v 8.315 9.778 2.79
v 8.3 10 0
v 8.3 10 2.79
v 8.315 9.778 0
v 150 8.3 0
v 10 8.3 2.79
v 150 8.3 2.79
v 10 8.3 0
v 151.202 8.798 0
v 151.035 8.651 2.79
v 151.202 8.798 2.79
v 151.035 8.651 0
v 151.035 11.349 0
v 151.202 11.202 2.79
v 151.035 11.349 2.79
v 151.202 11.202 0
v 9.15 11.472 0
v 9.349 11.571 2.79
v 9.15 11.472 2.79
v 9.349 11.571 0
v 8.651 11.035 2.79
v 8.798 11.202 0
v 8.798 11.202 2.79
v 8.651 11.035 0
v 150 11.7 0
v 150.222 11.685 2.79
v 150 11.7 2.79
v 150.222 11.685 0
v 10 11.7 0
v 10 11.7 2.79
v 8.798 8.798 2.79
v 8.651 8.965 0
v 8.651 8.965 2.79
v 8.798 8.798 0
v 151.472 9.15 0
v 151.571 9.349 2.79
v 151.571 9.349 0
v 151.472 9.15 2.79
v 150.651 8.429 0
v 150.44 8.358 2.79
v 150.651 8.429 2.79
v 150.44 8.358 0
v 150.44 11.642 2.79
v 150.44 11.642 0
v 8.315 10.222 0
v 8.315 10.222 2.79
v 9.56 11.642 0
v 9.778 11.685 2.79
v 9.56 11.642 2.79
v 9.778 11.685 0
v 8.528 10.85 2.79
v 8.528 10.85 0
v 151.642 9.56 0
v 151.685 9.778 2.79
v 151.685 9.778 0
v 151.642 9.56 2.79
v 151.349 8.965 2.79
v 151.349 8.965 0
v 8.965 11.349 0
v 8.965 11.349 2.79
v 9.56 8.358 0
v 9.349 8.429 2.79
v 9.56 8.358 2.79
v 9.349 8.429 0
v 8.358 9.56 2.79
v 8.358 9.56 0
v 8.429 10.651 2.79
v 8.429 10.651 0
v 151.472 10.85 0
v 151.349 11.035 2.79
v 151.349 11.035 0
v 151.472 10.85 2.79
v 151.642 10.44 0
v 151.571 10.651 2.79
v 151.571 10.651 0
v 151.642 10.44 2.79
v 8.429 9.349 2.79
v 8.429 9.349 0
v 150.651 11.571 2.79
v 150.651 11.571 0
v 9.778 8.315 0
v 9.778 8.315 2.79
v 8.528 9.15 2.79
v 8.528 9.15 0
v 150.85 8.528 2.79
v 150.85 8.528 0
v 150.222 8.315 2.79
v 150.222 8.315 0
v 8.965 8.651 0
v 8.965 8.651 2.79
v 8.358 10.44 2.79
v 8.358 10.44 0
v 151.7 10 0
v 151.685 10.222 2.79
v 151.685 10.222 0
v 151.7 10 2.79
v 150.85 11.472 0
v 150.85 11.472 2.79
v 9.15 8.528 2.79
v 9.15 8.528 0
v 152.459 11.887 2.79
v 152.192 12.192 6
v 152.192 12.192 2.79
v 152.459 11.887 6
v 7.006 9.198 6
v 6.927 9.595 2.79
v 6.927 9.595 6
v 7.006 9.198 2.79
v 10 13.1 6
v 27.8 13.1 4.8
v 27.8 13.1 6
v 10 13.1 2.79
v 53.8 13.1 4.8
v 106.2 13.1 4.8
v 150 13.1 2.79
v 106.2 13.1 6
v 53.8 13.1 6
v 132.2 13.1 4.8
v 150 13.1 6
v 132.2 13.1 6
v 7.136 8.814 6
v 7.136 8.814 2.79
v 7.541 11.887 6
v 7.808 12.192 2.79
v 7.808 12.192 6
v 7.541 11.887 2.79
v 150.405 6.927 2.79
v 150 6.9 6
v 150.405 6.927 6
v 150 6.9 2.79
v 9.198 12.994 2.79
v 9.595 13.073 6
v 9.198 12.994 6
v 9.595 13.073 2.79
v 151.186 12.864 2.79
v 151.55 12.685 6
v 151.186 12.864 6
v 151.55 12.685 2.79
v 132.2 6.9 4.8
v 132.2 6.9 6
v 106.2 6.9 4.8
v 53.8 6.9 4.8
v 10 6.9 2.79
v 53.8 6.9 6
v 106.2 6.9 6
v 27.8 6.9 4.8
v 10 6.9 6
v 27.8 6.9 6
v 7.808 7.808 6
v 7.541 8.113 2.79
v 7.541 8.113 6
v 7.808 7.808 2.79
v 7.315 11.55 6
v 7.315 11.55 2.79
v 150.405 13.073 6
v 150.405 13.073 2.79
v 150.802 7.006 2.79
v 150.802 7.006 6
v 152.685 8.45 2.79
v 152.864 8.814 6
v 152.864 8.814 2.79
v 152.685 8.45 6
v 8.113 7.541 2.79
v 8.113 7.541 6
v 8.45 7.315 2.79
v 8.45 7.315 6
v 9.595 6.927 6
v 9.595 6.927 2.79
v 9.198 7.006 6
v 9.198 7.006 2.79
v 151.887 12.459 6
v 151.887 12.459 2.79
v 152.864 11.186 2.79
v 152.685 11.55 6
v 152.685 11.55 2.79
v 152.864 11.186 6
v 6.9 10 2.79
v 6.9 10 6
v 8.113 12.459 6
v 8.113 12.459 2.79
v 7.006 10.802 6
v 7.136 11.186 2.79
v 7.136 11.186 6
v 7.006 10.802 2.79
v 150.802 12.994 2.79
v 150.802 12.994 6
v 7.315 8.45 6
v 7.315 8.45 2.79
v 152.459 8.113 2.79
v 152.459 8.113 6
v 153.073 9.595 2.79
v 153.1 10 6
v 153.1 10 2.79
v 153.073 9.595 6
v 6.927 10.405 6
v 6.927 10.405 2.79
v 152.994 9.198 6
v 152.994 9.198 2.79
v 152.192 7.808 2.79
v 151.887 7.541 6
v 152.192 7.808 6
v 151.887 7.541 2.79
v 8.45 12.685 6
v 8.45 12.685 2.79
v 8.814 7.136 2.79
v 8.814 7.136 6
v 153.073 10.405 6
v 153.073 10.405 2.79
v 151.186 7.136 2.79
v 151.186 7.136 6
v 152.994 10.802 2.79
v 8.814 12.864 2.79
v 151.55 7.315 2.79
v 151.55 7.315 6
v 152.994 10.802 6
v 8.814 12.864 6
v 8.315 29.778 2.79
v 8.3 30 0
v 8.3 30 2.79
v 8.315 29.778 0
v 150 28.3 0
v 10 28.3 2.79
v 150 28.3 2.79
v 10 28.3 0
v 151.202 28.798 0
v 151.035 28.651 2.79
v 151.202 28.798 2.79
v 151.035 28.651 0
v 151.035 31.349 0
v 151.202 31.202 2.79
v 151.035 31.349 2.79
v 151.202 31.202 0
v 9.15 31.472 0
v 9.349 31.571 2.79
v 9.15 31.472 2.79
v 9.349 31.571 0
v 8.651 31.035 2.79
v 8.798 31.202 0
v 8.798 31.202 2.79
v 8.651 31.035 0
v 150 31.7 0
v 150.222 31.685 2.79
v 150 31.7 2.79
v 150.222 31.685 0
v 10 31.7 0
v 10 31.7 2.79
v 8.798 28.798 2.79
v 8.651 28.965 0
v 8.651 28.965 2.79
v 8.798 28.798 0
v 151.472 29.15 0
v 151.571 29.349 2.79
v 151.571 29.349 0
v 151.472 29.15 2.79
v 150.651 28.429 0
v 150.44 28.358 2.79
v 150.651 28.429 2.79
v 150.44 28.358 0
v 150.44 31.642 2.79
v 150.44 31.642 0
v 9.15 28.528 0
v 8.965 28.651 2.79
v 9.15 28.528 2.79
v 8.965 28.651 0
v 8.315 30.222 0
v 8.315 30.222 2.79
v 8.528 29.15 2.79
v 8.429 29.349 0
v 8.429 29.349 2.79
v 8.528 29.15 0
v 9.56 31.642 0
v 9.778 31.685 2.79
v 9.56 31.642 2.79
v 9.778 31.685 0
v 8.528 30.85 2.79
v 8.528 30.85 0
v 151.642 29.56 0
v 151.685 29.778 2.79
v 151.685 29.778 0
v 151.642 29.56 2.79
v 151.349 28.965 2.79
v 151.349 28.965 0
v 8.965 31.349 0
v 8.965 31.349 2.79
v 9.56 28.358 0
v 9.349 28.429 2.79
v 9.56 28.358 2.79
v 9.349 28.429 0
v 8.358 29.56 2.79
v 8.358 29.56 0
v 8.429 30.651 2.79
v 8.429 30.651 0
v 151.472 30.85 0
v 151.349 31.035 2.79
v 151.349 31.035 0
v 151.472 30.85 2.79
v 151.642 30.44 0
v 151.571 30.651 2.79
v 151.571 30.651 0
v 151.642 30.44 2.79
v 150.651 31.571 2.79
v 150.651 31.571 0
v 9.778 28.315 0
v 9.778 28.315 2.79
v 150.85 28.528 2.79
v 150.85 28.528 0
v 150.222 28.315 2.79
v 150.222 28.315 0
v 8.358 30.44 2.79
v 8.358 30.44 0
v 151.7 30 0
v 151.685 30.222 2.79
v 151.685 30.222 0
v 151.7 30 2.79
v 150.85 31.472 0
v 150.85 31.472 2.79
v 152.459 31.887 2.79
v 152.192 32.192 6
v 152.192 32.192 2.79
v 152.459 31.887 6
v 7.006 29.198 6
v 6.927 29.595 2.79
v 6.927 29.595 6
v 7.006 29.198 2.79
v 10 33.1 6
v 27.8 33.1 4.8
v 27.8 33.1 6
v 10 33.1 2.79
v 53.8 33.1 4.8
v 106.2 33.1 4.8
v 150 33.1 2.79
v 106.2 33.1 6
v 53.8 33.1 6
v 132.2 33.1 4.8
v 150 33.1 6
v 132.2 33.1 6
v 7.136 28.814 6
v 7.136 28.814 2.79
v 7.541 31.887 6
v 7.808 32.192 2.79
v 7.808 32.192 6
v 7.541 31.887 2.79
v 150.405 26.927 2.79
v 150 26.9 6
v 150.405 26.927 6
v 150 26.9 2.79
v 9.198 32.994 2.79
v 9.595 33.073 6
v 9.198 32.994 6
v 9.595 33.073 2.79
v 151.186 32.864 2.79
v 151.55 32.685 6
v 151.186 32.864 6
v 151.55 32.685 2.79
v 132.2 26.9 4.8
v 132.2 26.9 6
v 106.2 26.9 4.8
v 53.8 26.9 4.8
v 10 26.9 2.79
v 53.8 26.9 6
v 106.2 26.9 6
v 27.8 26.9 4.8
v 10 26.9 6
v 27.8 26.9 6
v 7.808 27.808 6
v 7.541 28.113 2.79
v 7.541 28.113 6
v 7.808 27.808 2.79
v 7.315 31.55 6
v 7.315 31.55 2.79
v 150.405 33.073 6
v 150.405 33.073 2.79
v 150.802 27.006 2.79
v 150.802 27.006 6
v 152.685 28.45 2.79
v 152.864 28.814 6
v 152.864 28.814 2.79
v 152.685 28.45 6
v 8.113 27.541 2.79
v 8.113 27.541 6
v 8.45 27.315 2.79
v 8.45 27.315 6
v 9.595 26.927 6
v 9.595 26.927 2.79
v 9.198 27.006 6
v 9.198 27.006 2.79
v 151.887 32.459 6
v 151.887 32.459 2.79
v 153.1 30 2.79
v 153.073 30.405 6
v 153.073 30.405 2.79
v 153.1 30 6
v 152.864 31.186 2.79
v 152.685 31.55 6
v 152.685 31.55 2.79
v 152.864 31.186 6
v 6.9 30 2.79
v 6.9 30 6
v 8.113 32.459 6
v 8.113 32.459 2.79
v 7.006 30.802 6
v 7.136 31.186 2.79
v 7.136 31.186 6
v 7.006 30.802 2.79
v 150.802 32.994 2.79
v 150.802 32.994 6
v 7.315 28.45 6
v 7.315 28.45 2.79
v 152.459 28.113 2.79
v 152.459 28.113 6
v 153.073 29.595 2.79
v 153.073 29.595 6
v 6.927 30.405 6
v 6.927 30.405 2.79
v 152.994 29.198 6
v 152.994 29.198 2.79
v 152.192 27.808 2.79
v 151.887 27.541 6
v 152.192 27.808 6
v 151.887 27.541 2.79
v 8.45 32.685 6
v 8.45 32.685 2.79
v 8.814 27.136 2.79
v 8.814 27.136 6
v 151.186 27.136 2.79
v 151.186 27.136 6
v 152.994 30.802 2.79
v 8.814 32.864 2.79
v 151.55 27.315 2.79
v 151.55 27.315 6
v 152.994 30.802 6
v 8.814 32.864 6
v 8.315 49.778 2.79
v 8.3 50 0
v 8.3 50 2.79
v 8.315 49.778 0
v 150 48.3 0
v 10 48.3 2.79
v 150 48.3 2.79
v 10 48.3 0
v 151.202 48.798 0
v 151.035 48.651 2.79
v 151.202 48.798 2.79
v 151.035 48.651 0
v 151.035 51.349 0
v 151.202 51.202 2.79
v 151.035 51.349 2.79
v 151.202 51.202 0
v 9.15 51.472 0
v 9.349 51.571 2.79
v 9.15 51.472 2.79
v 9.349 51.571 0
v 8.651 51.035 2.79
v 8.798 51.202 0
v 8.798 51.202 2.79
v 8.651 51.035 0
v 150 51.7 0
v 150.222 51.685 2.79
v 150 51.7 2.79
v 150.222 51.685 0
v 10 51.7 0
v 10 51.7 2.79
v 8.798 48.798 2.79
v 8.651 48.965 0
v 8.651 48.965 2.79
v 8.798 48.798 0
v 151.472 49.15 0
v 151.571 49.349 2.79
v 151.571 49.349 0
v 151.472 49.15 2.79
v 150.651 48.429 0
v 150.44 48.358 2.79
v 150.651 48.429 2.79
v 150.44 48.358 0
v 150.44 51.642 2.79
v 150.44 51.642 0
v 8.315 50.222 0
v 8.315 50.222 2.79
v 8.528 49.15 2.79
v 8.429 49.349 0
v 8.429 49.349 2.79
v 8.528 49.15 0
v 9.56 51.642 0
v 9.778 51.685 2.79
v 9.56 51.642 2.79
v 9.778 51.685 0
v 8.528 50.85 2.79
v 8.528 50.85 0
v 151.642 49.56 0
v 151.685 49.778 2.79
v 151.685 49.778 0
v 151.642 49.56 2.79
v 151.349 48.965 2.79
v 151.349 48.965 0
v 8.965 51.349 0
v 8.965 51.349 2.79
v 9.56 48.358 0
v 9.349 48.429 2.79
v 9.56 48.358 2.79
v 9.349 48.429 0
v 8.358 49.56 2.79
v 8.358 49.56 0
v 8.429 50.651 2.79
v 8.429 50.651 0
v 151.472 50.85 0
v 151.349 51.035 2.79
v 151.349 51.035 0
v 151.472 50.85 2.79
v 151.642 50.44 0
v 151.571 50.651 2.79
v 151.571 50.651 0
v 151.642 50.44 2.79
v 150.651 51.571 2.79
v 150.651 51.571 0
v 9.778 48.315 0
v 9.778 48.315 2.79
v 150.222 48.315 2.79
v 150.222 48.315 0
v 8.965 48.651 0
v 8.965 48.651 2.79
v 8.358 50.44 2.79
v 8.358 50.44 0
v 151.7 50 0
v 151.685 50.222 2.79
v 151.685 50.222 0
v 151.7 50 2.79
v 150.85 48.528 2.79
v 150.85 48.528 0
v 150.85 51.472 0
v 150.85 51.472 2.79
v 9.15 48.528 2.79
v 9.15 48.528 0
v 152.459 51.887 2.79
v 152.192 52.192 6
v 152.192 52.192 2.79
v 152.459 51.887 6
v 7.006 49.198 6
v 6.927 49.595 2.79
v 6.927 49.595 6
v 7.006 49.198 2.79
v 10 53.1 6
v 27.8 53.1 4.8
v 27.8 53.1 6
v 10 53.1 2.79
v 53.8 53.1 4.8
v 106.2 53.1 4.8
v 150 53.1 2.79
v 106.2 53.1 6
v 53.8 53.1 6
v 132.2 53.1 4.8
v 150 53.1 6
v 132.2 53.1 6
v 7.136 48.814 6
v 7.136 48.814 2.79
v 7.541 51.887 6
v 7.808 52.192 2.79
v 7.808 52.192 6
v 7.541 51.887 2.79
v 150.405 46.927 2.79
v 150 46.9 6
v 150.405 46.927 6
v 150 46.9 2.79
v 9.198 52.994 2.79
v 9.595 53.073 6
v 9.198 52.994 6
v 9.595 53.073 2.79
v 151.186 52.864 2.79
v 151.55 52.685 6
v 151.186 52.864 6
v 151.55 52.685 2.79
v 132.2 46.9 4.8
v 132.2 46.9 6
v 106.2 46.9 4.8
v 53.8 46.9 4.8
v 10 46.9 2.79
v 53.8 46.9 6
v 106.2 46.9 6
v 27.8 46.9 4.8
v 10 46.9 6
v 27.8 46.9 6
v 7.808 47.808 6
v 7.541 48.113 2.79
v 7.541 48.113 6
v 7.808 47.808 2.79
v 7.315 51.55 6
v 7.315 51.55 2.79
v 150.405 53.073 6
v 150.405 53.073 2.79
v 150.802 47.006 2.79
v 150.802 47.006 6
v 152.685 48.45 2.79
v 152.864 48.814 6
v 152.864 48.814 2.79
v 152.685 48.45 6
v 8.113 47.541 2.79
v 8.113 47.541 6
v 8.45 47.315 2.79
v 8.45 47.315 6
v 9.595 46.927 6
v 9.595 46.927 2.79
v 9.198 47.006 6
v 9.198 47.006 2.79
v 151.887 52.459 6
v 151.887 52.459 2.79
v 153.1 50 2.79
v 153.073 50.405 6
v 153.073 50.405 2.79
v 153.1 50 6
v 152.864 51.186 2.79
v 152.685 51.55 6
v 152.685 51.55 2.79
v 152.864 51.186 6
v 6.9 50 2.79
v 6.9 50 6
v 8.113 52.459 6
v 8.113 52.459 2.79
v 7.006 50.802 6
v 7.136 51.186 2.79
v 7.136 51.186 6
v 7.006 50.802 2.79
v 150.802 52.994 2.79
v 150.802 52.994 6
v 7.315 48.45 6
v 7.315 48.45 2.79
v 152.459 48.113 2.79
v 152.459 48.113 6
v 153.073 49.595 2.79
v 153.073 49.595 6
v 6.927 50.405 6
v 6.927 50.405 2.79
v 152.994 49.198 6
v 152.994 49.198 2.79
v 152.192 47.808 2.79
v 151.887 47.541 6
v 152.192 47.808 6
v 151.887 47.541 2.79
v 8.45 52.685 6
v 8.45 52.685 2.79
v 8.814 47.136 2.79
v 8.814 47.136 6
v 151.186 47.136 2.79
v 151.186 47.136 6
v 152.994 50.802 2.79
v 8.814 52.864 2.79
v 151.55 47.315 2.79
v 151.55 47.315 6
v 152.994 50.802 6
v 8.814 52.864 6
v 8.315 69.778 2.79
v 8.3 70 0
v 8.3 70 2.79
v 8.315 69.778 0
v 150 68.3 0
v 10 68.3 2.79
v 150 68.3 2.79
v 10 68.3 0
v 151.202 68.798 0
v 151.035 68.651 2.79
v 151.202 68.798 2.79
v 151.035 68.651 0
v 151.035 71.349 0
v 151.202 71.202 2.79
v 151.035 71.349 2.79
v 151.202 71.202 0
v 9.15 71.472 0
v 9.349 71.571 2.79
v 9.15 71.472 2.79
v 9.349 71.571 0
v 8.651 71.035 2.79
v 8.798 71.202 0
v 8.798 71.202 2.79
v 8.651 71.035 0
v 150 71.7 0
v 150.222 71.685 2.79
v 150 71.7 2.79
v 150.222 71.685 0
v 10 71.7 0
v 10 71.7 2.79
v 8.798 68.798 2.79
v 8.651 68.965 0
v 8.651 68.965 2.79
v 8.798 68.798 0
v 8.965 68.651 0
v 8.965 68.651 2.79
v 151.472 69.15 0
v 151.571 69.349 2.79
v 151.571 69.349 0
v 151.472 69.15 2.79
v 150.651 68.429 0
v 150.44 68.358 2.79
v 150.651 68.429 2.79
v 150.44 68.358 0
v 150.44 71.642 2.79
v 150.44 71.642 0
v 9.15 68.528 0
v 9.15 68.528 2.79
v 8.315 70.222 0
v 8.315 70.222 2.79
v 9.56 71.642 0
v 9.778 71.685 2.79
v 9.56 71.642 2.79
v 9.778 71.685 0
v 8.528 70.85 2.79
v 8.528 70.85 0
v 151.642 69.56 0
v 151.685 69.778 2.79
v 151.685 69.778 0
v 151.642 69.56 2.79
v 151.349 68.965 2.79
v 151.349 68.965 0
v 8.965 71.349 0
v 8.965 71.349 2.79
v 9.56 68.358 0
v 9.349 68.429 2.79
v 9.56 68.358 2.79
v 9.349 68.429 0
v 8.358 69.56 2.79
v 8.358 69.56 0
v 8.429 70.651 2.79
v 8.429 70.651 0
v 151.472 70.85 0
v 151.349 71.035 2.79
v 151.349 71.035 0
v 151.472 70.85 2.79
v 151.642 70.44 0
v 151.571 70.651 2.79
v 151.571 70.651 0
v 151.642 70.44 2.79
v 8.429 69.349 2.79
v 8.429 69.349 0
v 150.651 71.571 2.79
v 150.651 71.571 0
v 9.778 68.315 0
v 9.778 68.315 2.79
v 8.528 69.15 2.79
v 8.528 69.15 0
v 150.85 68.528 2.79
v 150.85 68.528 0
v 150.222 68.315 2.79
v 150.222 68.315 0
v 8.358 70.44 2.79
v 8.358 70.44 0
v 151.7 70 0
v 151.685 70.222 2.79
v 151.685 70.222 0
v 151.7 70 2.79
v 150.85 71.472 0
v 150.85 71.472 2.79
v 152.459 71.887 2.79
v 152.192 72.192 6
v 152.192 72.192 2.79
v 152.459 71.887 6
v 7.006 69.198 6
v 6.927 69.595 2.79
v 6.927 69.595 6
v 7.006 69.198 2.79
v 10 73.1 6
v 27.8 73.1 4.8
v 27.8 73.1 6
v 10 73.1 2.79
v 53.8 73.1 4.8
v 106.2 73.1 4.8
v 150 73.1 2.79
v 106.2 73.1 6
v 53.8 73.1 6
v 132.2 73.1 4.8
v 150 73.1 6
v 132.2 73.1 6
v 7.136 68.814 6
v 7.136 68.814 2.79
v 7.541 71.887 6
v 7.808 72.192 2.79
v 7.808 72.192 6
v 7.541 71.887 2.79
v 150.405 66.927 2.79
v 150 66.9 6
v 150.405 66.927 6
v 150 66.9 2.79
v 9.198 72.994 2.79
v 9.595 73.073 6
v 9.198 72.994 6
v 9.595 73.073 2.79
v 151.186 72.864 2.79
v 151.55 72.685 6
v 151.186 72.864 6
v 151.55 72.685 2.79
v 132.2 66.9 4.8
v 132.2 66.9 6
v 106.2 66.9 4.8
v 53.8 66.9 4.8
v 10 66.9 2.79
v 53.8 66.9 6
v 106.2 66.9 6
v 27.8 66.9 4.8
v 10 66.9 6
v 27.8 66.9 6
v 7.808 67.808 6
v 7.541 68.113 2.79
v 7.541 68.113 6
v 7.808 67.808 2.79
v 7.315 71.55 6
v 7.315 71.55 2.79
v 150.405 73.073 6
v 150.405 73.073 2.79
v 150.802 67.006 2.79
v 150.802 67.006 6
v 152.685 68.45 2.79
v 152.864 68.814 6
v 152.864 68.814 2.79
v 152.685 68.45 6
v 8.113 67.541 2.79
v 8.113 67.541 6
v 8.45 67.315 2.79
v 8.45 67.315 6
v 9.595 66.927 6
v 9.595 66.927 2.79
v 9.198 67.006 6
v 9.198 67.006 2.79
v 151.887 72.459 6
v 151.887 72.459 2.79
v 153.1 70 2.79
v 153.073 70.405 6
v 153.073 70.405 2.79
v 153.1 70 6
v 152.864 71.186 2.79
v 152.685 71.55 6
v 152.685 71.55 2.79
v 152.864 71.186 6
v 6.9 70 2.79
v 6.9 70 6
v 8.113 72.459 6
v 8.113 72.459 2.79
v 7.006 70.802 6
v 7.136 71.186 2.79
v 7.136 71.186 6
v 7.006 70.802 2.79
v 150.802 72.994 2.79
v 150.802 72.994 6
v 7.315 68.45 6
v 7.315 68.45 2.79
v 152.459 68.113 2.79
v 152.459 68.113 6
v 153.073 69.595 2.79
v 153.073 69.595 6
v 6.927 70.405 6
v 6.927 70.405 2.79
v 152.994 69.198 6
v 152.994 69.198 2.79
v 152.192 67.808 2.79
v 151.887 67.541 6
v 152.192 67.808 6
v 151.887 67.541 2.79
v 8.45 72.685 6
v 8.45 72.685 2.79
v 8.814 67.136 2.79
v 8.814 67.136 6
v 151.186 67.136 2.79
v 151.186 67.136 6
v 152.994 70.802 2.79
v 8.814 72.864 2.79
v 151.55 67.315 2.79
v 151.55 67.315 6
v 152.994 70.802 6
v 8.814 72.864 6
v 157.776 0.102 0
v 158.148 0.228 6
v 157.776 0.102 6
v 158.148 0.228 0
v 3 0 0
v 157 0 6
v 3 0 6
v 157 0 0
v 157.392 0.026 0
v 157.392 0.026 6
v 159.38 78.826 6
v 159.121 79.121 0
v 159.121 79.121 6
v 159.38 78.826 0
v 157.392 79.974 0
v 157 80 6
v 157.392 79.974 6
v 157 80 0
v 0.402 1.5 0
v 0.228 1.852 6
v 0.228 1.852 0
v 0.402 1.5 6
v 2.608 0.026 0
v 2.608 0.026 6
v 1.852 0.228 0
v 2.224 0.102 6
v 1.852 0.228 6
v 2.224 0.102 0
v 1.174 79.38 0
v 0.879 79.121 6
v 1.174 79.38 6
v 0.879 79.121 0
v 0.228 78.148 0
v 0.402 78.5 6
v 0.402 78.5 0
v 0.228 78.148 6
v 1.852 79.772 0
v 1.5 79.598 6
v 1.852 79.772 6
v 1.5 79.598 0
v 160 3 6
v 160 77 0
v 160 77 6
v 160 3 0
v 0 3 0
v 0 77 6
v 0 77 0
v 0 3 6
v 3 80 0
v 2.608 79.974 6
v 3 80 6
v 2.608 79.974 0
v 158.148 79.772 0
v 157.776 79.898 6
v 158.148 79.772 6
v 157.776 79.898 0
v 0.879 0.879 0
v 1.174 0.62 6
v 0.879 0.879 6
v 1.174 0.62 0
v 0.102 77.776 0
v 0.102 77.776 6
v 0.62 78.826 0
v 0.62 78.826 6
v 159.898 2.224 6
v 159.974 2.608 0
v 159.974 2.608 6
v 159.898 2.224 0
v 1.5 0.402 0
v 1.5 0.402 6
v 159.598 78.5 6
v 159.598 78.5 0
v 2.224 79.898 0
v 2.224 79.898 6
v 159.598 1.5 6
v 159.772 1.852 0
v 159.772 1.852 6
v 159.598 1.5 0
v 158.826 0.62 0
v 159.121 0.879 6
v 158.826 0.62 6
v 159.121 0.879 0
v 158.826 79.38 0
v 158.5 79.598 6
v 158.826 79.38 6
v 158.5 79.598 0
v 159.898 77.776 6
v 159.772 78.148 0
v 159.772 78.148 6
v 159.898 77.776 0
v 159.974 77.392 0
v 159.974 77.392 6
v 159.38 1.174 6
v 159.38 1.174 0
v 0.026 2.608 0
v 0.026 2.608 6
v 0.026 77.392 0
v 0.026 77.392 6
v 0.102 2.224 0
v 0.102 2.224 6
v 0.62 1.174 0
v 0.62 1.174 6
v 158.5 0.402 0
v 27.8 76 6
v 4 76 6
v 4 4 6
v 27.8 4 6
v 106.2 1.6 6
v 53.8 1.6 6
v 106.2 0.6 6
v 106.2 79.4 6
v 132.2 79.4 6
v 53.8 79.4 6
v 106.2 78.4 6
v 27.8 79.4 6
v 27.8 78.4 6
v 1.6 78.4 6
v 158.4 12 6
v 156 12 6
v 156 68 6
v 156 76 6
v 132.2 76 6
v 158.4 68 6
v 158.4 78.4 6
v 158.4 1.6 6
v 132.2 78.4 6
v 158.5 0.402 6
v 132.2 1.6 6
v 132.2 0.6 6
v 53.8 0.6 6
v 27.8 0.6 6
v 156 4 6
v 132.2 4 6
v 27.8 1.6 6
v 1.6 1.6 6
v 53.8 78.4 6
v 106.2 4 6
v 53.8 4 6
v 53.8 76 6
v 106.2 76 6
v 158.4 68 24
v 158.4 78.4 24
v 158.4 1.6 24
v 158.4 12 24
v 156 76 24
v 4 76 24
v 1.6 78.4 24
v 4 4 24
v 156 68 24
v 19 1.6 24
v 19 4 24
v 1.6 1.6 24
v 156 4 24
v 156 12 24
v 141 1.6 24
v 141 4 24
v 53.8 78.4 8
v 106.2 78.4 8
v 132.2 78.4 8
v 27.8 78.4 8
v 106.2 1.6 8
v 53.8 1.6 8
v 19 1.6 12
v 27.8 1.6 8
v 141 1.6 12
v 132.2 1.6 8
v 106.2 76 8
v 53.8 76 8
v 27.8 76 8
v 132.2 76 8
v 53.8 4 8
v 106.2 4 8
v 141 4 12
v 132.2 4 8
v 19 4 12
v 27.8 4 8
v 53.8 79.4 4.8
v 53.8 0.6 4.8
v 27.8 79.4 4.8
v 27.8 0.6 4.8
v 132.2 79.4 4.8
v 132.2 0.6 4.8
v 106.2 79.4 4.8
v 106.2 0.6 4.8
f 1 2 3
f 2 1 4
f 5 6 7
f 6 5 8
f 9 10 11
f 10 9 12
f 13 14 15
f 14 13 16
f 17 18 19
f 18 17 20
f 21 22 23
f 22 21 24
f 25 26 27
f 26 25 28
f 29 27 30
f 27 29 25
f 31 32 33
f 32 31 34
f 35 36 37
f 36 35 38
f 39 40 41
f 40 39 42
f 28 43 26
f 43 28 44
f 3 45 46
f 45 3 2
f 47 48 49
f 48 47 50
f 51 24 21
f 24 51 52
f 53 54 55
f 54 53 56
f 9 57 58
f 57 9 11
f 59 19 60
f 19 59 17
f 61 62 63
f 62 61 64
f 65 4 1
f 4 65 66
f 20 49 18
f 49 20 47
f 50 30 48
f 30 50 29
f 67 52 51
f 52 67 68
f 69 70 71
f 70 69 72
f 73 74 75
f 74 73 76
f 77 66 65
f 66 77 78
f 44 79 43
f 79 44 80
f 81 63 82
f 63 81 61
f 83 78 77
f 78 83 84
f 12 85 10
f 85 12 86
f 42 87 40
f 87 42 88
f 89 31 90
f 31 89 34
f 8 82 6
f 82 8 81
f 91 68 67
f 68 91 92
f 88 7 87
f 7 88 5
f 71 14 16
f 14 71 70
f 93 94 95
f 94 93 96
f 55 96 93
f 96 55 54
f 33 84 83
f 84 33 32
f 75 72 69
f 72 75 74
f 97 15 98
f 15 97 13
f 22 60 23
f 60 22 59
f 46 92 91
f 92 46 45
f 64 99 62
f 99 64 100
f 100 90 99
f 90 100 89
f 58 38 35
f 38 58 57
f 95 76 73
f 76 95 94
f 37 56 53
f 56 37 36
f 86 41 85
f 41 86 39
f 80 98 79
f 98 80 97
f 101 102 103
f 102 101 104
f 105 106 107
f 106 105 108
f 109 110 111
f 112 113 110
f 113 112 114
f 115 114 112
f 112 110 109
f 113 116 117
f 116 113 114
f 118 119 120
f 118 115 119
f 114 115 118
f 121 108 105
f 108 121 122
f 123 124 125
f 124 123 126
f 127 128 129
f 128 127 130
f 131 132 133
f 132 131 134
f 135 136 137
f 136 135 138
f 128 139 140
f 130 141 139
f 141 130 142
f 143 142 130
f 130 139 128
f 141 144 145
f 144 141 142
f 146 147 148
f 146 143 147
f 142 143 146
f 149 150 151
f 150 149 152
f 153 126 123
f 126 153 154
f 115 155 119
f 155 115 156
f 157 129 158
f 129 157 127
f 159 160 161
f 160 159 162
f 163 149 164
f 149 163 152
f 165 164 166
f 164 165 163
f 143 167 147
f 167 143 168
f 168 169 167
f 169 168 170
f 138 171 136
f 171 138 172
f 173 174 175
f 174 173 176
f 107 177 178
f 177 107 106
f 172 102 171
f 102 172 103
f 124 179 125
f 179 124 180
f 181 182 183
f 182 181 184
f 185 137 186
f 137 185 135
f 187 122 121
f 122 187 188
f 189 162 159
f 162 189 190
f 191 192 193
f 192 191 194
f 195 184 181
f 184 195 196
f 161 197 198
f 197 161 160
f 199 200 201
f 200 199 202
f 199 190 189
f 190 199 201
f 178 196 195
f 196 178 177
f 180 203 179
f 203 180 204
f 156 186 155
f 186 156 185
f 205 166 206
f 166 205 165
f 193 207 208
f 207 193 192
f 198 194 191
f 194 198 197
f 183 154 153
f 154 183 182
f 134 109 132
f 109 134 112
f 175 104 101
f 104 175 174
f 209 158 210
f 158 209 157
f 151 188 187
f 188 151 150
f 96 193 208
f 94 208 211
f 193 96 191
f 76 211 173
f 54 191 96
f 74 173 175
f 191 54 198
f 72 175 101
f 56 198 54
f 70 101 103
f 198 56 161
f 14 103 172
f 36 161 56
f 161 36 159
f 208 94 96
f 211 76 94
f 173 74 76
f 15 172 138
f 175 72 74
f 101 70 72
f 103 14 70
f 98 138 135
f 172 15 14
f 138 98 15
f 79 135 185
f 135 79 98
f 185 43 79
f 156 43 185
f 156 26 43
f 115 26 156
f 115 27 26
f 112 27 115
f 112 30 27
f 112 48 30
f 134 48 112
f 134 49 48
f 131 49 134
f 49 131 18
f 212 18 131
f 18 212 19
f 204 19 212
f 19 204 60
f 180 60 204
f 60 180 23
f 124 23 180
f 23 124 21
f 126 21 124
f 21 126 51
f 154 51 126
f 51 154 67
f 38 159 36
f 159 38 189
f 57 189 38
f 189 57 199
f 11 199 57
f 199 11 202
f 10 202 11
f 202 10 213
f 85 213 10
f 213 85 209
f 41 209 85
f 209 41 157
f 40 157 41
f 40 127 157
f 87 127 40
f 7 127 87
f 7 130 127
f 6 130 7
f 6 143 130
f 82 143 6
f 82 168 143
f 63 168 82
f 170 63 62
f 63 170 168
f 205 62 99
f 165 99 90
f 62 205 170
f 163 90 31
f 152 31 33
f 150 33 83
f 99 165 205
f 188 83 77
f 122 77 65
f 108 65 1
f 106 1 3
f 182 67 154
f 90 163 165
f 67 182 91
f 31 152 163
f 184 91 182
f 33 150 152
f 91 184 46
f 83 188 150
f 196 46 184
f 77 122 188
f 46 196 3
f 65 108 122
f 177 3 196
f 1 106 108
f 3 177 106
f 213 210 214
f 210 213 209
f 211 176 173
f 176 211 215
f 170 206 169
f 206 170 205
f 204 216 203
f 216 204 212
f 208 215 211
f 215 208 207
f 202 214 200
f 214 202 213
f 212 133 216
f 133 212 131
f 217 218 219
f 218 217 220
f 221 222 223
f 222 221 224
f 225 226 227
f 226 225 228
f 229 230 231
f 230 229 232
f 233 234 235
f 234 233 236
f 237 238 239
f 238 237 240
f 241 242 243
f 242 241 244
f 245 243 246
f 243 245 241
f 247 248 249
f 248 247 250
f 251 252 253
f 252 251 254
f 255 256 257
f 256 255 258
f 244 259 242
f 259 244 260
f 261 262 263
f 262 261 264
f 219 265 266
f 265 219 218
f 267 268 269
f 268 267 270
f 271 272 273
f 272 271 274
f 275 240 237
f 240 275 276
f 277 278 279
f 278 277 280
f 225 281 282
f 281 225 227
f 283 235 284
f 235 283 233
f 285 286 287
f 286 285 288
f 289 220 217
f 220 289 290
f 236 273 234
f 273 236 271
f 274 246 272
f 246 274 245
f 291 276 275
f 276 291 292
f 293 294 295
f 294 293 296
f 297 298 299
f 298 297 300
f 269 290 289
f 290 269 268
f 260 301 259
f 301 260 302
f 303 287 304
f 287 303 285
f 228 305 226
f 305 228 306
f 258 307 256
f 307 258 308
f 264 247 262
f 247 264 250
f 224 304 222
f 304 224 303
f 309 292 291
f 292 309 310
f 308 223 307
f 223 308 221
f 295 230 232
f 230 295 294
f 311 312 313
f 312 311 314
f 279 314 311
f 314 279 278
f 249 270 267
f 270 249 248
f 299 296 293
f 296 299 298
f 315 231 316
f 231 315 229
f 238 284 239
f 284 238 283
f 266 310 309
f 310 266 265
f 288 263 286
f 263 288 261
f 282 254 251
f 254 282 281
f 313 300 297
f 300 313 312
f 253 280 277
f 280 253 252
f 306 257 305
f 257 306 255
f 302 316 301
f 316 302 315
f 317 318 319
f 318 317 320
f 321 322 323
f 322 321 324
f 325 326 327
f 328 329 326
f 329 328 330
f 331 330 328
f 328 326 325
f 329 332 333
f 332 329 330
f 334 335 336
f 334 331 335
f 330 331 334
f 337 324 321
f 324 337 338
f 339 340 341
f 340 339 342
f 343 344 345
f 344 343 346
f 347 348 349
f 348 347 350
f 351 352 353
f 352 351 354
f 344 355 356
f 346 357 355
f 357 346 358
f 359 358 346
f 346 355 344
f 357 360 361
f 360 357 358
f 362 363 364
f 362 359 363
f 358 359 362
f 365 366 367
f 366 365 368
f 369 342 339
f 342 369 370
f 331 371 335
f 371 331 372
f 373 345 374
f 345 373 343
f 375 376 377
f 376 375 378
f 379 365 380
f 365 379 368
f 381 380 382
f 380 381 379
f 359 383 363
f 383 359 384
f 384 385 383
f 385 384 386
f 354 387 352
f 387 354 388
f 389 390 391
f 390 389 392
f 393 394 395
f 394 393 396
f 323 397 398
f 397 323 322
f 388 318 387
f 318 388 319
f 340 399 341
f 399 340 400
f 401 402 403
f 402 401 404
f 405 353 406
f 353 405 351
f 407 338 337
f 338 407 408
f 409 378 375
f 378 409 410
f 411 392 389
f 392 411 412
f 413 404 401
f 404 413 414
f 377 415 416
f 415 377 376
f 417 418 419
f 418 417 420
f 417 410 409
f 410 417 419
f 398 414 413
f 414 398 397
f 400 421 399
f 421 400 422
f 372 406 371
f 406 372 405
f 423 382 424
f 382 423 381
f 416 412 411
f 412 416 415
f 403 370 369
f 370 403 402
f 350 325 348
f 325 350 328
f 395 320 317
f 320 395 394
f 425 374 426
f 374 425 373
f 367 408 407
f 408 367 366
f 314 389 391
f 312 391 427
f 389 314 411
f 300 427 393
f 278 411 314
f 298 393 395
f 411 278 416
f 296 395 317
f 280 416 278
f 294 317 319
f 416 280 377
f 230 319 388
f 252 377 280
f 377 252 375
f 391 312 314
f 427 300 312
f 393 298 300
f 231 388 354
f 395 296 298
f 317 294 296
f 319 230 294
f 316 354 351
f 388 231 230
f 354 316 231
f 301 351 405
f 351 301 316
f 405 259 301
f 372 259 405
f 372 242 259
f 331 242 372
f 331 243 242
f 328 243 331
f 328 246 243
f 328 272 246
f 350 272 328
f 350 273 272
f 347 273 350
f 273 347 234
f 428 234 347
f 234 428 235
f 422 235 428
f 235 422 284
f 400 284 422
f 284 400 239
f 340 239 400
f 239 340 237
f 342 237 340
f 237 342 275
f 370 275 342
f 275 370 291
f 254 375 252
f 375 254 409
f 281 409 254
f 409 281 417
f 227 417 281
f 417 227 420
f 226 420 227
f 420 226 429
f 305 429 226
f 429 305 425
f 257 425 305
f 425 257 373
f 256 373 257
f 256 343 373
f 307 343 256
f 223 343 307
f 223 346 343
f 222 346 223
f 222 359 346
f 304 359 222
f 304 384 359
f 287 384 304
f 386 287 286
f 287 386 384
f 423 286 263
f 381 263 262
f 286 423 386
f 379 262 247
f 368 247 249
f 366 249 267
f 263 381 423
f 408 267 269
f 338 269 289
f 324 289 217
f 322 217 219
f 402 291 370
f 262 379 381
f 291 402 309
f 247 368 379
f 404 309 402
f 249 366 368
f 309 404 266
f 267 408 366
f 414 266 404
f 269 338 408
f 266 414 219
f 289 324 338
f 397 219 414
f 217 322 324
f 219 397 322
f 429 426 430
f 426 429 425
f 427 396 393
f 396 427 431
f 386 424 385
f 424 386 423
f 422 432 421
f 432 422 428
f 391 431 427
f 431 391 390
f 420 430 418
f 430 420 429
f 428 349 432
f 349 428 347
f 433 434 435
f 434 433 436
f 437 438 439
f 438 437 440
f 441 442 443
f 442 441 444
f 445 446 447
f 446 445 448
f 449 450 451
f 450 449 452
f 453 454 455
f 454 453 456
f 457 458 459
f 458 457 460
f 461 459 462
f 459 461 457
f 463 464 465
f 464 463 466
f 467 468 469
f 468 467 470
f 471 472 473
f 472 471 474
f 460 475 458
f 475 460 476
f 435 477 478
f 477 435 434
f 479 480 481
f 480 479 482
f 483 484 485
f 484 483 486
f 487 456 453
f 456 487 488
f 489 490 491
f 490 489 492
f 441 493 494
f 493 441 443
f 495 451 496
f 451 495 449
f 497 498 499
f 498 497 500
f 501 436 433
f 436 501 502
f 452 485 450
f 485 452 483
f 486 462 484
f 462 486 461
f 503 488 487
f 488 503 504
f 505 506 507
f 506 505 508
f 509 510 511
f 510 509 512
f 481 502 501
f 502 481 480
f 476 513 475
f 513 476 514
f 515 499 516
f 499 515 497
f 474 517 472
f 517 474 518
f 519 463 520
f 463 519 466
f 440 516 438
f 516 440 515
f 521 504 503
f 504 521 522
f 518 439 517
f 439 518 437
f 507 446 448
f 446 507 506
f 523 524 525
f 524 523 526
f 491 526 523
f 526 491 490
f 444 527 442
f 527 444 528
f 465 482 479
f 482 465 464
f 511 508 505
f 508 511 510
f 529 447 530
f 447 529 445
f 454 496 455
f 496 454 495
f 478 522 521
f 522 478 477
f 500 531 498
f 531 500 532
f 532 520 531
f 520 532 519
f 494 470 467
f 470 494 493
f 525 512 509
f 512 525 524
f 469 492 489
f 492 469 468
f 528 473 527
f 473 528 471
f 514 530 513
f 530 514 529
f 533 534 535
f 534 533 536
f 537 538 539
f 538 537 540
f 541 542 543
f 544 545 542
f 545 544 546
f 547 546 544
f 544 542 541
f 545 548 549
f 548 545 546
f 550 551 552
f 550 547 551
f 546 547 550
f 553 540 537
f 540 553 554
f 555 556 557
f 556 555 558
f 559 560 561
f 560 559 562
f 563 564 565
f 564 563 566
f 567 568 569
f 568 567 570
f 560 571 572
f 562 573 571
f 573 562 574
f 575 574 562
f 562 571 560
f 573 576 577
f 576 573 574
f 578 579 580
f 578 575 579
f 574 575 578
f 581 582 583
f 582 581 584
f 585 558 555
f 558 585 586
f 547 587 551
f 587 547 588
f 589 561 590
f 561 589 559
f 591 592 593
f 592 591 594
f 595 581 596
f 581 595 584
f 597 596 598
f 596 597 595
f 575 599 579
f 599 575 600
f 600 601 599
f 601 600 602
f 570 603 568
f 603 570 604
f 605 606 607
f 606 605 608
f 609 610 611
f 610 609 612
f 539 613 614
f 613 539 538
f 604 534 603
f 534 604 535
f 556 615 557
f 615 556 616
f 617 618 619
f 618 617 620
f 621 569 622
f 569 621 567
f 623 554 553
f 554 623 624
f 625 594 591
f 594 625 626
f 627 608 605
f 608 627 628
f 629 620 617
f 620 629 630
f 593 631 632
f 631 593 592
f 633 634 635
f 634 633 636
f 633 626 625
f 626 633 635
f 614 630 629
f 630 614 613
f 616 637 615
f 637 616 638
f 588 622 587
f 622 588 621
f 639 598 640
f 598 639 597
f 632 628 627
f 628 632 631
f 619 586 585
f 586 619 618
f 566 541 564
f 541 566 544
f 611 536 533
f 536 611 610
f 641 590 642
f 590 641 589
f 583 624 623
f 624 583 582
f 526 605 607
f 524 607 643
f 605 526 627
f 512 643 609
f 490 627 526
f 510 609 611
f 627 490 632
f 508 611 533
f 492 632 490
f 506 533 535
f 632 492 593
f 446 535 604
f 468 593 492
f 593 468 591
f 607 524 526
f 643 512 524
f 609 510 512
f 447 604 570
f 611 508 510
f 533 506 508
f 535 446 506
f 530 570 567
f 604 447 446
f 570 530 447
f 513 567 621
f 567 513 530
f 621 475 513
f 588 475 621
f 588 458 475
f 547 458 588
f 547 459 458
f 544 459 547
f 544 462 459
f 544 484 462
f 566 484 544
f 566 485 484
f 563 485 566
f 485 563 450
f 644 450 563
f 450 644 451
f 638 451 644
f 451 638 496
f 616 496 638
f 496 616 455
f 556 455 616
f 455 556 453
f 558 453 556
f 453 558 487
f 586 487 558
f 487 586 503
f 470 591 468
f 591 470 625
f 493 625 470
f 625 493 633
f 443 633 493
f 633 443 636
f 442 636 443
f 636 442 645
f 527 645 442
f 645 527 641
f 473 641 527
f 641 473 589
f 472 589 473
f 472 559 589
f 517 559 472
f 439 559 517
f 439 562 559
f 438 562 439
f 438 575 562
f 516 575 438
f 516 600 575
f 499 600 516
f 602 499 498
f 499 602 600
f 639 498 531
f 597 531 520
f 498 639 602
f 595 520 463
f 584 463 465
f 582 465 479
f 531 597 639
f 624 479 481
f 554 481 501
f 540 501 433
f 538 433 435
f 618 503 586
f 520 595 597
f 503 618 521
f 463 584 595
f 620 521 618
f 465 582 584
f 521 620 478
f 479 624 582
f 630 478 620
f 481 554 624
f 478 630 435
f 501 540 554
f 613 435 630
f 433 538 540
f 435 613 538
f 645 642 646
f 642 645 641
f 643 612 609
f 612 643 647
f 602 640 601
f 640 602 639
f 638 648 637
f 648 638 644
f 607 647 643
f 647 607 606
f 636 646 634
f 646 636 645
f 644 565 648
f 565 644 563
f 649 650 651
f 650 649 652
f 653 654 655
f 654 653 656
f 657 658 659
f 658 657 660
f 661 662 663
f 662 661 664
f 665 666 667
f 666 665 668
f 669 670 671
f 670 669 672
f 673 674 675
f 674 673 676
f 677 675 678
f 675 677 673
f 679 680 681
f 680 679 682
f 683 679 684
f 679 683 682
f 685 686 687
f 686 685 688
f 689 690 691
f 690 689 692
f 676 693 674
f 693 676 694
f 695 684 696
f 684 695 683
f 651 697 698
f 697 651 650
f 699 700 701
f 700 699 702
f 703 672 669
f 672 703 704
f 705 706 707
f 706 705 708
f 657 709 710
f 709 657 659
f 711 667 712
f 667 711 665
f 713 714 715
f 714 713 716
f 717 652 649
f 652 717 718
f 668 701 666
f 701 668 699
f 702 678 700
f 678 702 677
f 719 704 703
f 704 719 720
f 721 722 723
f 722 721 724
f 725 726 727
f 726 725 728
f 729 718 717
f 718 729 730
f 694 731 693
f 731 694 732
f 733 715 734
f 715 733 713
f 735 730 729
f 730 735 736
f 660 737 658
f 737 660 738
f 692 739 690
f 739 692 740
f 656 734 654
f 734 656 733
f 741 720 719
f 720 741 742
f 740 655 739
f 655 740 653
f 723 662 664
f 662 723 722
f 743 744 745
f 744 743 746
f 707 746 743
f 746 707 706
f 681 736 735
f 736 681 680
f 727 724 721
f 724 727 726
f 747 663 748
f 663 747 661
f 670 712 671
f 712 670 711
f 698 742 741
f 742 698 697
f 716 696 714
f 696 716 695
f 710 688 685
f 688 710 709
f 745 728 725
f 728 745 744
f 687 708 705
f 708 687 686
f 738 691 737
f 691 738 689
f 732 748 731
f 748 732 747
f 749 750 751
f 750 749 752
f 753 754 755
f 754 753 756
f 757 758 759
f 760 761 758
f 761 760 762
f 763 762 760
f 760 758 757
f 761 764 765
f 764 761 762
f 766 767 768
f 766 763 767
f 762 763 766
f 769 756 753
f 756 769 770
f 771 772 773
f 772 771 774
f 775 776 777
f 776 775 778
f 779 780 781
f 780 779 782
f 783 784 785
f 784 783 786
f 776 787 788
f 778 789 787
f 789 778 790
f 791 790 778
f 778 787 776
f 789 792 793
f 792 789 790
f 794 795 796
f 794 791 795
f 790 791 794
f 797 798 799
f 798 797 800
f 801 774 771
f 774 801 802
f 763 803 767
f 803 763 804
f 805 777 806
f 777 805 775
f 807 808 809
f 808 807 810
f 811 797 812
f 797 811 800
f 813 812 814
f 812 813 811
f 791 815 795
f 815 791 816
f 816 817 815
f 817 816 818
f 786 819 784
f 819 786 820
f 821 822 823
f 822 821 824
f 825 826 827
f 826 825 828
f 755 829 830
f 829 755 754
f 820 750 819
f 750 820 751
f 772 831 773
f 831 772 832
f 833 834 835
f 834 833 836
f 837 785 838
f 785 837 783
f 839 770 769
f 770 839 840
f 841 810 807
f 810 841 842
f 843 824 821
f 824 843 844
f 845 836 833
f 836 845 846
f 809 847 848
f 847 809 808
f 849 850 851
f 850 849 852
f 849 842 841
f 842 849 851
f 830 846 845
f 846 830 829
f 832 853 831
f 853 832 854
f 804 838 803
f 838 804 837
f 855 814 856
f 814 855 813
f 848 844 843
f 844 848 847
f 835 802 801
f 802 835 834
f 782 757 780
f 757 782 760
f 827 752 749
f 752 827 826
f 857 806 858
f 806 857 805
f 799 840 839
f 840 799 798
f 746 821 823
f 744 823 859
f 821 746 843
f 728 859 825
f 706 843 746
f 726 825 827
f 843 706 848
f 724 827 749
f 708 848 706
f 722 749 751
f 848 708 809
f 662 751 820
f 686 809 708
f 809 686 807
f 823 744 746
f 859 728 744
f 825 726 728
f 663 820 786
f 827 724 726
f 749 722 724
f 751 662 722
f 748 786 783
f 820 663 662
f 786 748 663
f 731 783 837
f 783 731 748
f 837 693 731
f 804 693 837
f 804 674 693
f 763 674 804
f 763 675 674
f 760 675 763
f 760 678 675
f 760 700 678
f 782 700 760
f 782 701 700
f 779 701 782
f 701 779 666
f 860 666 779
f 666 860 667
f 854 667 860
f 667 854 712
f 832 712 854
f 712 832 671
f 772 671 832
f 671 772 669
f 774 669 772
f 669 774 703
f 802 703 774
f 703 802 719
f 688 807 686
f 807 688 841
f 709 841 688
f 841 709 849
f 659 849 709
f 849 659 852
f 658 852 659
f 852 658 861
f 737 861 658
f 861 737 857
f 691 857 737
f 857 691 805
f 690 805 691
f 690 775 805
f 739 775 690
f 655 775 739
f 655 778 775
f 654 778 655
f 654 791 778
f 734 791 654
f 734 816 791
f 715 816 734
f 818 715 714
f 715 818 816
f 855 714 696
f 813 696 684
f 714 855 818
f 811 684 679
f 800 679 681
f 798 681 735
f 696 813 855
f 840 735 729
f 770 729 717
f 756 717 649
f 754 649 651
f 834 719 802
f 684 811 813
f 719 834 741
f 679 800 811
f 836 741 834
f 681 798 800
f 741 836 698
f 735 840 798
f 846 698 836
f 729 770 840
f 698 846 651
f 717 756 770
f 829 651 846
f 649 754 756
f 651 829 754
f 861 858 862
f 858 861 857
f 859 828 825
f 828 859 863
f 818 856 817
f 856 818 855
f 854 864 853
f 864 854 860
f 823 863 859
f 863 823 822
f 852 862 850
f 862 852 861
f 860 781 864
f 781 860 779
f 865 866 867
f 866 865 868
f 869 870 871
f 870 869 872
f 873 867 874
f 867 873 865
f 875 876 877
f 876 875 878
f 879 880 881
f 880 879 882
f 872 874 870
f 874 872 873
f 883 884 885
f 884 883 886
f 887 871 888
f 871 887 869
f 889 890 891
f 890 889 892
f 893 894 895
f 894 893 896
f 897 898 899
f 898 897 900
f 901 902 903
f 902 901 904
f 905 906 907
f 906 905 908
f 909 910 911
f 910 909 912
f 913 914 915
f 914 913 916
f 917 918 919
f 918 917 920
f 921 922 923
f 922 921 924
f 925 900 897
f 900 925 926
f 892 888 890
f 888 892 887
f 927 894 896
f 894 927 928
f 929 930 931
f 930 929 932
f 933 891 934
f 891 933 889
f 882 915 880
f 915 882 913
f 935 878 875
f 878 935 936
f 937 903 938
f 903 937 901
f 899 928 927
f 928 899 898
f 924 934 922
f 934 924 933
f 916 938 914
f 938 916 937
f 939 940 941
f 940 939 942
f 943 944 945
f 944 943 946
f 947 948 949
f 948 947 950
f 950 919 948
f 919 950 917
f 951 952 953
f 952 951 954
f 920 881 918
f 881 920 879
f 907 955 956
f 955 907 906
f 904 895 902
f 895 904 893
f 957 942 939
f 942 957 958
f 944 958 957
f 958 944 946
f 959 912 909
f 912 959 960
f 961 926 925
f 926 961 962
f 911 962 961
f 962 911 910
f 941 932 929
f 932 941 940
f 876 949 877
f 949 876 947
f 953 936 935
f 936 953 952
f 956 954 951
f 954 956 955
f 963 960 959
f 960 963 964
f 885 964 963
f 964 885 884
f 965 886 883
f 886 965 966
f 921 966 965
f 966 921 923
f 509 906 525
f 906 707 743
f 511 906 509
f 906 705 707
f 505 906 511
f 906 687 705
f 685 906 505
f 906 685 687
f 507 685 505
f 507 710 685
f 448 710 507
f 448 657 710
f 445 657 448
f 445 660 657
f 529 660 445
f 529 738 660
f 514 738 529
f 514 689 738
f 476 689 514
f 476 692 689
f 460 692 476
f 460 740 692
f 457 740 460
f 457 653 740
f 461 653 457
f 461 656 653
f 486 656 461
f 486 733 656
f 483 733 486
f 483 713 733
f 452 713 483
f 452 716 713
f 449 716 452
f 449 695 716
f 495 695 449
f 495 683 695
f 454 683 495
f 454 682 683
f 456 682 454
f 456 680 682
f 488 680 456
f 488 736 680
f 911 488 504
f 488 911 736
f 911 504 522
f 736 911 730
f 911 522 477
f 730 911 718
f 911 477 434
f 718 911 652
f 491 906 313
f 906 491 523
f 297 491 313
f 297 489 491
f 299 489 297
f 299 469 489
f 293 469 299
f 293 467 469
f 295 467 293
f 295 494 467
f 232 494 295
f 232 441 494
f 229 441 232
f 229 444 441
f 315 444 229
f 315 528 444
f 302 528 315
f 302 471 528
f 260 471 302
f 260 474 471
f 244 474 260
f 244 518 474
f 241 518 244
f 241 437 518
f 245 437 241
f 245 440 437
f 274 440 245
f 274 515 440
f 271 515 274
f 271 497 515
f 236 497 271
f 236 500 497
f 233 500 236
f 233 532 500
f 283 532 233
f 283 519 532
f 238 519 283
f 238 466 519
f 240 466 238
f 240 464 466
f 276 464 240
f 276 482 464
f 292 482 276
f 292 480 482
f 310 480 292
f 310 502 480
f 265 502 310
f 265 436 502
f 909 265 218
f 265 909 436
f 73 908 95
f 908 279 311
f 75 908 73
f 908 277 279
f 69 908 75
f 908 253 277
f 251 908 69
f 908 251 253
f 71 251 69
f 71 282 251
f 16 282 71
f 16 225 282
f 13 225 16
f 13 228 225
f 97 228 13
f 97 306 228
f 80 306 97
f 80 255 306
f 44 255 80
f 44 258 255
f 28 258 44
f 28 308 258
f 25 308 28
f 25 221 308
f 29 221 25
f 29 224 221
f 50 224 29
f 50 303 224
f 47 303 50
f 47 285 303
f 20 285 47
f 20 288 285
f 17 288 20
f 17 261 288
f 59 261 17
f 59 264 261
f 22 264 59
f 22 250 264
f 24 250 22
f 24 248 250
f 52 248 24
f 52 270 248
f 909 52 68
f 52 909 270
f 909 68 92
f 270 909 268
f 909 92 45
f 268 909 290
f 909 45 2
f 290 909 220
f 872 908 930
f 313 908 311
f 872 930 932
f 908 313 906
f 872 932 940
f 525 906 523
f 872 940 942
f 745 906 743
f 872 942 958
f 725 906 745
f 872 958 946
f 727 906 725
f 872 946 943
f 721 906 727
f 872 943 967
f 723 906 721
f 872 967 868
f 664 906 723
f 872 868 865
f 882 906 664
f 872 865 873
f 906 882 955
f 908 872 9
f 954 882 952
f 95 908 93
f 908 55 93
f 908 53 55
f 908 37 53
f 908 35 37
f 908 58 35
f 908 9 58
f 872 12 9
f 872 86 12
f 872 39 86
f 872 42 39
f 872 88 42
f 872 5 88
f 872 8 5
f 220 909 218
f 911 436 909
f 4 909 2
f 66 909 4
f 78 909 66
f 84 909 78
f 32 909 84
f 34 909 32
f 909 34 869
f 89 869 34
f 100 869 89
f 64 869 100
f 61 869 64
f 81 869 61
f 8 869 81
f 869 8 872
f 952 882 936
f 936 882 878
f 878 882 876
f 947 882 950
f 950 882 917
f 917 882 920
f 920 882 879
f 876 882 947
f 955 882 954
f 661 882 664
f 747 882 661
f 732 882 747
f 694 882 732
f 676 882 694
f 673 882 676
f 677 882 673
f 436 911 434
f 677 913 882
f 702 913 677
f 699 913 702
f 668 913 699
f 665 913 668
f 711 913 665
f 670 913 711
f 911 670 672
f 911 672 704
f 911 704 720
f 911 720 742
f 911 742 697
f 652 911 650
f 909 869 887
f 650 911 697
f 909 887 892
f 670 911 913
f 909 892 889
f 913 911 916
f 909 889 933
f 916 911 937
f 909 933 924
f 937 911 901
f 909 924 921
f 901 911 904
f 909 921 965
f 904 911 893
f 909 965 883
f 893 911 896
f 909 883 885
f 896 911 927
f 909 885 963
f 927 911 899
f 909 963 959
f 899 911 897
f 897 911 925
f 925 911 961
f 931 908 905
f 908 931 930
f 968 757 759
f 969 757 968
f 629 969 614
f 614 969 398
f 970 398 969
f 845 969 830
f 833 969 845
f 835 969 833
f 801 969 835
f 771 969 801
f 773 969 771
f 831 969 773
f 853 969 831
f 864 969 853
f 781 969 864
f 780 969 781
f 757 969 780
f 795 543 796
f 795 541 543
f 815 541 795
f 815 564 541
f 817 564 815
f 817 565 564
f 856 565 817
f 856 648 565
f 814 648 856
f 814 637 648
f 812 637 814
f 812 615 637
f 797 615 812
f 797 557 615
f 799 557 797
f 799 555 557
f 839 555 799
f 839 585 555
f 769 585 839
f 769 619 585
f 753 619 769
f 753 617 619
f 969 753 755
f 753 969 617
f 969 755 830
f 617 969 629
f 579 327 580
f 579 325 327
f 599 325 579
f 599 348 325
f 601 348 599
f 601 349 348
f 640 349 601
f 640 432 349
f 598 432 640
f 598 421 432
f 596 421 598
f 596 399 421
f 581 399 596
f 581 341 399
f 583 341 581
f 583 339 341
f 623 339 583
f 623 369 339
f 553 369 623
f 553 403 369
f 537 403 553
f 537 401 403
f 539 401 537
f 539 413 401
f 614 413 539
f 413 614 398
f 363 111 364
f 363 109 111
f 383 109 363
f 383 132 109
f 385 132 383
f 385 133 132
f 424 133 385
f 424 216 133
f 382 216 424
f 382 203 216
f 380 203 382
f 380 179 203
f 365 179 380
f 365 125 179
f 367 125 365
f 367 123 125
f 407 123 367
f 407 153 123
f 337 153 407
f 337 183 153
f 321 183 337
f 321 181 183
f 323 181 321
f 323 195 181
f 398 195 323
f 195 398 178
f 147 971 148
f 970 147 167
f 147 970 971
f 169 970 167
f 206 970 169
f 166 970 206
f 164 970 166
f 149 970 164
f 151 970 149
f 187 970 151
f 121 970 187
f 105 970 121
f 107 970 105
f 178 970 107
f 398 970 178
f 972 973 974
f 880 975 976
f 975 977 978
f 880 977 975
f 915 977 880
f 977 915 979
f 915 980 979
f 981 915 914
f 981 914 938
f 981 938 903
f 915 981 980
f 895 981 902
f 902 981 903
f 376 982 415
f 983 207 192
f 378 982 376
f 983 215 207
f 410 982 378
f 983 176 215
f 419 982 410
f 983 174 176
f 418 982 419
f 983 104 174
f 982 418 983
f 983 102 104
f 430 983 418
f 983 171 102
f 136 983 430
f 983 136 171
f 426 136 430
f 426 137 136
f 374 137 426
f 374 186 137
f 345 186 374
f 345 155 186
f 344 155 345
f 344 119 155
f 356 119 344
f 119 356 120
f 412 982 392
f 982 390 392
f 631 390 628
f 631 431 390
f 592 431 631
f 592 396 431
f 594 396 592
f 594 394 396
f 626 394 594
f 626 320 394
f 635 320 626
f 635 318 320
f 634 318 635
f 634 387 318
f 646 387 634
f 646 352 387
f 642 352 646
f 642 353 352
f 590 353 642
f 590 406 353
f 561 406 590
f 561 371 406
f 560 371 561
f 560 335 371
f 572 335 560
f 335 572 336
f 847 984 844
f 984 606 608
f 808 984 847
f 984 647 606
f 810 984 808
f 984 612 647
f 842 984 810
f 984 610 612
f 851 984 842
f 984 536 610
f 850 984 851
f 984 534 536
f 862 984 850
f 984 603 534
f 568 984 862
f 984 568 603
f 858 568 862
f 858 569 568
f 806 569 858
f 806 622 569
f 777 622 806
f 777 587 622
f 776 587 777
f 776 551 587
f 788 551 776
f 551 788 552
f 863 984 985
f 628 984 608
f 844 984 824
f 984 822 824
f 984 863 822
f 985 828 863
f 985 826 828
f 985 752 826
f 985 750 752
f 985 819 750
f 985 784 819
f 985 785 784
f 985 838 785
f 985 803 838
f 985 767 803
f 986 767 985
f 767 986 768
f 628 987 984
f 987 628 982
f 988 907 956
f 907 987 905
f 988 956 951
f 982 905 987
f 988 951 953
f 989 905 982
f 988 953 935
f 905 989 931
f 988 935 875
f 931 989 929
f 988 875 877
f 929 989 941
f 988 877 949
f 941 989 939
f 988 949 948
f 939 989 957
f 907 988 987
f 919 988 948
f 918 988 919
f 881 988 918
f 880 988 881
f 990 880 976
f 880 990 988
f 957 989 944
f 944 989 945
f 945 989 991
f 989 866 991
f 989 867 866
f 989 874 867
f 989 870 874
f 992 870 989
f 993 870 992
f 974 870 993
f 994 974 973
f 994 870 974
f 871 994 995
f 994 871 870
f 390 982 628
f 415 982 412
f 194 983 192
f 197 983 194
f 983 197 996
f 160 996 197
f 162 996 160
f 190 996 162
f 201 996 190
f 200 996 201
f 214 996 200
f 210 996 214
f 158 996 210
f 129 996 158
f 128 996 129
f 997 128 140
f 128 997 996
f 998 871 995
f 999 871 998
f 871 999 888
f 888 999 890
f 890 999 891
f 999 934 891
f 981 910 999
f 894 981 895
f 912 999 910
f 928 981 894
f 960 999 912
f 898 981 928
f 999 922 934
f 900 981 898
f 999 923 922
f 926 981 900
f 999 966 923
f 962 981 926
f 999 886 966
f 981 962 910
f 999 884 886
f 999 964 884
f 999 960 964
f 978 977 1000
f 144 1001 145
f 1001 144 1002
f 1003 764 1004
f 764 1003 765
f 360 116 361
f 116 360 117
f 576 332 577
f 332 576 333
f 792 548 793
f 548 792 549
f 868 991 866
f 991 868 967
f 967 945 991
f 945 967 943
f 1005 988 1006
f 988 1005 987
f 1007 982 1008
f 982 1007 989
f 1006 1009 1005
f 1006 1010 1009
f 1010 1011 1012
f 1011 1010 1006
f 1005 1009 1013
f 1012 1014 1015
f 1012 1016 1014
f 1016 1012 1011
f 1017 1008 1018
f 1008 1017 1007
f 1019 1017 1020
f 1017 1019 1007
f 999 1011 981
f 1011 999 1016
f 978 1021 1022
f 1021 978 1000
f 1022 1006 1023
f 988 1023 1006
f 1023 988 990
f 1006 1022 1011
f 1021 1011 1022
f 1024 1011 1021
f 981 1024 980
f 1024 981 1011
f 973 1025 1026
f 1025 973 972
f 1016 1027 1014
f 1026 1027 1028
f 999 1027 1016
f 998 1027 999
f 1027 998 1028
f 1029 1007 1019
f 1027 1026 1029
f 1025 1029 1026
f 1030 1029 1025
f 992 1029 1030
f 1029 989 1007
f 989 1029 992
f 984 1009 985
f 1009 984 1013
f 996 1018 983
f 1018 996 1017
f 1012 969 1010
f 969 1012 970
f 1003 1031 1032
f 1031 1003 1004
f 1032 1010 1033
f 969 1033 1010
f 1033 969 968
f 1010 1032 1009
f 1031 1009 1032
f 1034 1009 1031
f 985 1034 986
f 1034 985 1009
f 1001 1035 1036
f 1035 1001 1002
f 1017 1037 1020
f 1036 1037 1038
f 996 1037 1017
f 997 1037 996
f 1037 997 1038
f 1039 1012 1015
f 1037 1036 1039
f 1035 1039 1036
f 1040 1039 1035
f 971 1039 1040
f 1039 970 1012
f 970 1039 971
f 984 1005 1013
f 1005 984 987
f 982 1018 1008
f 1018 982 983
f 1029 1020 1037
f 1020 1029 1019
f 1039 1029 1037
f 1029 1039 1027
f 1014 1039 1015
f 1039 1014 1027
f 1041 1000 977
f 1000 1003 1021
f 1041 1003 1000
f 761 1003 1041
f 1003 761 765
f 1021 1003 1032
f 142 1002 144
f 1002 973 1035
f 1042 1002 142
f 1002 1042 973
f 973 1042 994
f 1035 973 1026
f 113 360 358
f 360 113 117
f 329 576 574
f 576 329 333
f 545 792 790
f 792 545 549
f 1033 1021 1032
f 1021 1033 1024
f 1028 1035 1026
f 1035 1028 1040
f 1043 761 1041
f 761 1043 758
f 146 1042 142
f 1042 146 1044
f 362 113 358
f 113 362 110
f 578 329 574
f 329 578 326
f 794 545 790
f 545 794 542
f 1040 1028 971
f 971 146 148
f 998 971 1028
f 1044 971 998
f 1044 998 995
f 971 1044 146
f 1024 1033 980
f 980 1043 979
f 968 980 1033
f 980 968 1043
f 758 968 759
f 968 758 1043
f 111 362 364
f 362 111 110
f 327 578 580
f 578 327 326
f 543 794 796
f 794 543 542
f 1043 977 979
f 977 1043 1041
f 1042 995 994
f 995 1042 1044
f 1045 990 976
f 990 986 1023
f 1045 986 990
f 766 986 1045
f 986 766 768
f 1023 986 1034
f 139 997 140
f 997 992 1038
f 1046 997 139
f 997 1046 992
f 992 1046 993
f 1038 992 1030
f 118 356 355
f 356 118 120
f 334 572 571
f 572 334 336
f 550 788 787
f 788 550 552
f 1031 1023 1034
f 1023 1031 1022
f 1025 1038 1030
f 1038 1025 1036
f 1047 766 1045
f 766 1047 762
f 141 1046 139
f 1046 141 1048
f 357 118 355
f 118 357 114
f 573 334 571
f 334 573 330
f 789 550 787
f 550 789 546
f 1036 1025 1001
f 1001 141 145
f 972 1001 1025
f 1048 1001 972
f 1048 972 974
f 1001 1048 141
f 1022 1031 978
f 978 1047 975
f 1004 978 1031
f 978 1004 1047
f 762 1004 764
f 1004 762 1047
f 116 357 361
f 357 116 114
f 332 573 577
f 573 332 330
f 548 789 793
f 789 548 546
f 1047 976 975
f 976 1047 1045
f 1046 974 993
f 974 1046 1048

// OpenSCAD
// file: bugout.scad
// bugout.scad - shared library for the Bugout SDR mounting system.
//
// Everything mounts on a 20 mm grid of M3 holes. Base tiles carry captive
// M3 nuts underneath, so any bracket with grid-spaced slots can be bolted
// anywhere on the floor with M3 x 8-12 mm screws.
//
// Include this from part files with:  include <bugout.scad>

$fn = 48;

// ---- Grid and hardware ---------------------------------------------------
PITCH      = 20;     // grid spacing, mm
M3_CLEAR   = 3.4;    // M3 clearance hole
M3_HEAD_D  = 6.2;    // M3 socket head counterbore
M3_HEAD_H  = 3.2;
M3_NUT_AF  = 5.7;    // M3 nut across flats, with print clearance
M3_NUT_H   = 2.6;
M3_INSERT  = 4.2;    // hole for M3 heat-set insert (if you prefer inserts)

// ---- Printing ------------------------------------------------------------
WALL   = 2.4;        // default wall, a multiple of a 0.4 nozzle
CHAMF  = 0.8;        // edge chamfer

// ---- Helpers -------------------------------------------------------------

// Hexagon prism for a nut trap, flats aligned with X.
module nut_trap(h = M3_NUT_H, af = M3_NUT_AF) {
    cylinder(d = af / cos(30), h = h, $fn = 6);
}

// Through hole for M3, optionally with counterbore at the top (z = h).
module m3_hole(h, counterbore = false) {
    translate([0, 0, -0.01]) cylinder(d = M3_CLEAR, h = h + 0.02);
    if (counterbore)
        translate([0, 0, h - M3_HEAD_H]) cylinder(d = M3_HEAD_D, h = M3_HEAD_H + 0.01);
}

// Slot of length len (centre to centre) along X, for M3.
module m3_slot(len, h, d = M3_CLEAR) {
    translate([0, 0, -0.01]) hull() {
        cylinder(d = d, h = h + 0.02);
        translate([len, 0, 0]) cylinder(d = d, h = h + 0.02);
    }
}

// Rounded rectangle plate, corner radius r, origin at the corner.
module rplate(w, d, h, r = 3) {
    r2 = min(r, w / 2 - 0.01, d / 2 - 0.01);
    translate([r2, r2, 0]) linear_extrude(h)
        offset(r = r2) square([w - 2 * r2, d - 2 * r2]);
}

// Grid of points, nx by ny, starting at (x0, y0).
module grid(nx, ny, x0 = 0, y0 = 0, p = PITCH) {
    for (i = [0 : nx - 1], j = [0 : ny - 1])
        translate([x0 + i * p, y0 + j * p, 0]) children();
}

// Mounting foot: a plate with M3 slots on the grid, so any part can be
// bolted down and slid up to one pitch along X. Footprint nx x ny cells.
// With counterbore = true the screw heads sit flush with the top (h >= 6),
// so a battery or dongle can sit directly on the foot.
module grid_foot(nx, ny, h = 4, counterbore = false) {
    difference() {
        rplate(nx * PITCH, ny * PITCH, h);
        for (j = [0 : ny - 1])
            translate([PITCH / 2, PITCH / 2 + j * PITCH, 0]) {
                m3_slot((nx - 1) * PITCH, h);
                if (counterbore)
                    translate([0, 0, h - M3_HEAD_H])
                        m3_slot((nx - 1) * PITCH, M3_HEAD_H, M3_HEAD_D);
            }
    }
}

// Velcro / strap slot through a wall, slot width sw, height sh.
module strap_slot(sw = 22, sh = 3, depth = 20) {
    translate([-sw / 2, -depth / 2, 0]) cube([sw, depth, sh]);
}
// main file
// strap_cradle.scad - cradle for the Anker battery pack (or anything boxy).
//
// Two end walls and a side wall hold the pack, and slots take a 20-25 mm
// velcro strap over the top. Set the inner size to your pack plus ~1 mm.
// The base is a grid foot, so it bolts to the floor tiles.
//
// Print flat. No supports.

include <bugout.scad>

IN_W   = 152;   // inner length along X  (MEASURE YOUR PACK)
IN_D   = 72;    // inner width along Y
WALL_H = 18;    // wall height, about 2/3 of the pack's thickness
STRAP_W = 26;   // strap slot width
BASE_T = 6;
OPEN_END = true;  // leave the +X end open for the USB ports

OW = IN_W + 2 * WALL;
OD = IN_D + 2 * WALL;
NX = ceil(OW / PITCH);
NY = ceil(OD / PITCH);
X0 = (NX * PITCH - OW) / 2;
Y0 = (NY * PITCH - OD) / 2;

difference() {
    union() {
        grid_foot(NX, NY, BASE_T, counterbore = true);
        translate([X0, Y0, BASE_T]) difference() {
            cube([OW, OD, WALL_H]);
            translate([WALL, WALL, -1]) cube([IN_W, IN_D, WALL_H + 2]);
            if (OPEN_END)
                translate([WALL + IN_W - 1, WALL + 8, -1])
                    cube([WALL + 2, IN_D - 16, WALL_H + 2]);
            // front wall cut low so the pack lifts out
            translate([WALL + 15, -1, 6]) cube([IN_W - 30, WALL + 2, WALL_H]);
        }
    }
    // strap channels: the strap runs under the pack, out through both long
    // walls, then up and over the top
    for (x = [OW * 0.25, OW * 0.75])
        translate([X0 + x, Y0 + OD / 2, BASE_T - 1.2])
            strap_slot(STRAP_W, 3.2, OD + 2);
}
